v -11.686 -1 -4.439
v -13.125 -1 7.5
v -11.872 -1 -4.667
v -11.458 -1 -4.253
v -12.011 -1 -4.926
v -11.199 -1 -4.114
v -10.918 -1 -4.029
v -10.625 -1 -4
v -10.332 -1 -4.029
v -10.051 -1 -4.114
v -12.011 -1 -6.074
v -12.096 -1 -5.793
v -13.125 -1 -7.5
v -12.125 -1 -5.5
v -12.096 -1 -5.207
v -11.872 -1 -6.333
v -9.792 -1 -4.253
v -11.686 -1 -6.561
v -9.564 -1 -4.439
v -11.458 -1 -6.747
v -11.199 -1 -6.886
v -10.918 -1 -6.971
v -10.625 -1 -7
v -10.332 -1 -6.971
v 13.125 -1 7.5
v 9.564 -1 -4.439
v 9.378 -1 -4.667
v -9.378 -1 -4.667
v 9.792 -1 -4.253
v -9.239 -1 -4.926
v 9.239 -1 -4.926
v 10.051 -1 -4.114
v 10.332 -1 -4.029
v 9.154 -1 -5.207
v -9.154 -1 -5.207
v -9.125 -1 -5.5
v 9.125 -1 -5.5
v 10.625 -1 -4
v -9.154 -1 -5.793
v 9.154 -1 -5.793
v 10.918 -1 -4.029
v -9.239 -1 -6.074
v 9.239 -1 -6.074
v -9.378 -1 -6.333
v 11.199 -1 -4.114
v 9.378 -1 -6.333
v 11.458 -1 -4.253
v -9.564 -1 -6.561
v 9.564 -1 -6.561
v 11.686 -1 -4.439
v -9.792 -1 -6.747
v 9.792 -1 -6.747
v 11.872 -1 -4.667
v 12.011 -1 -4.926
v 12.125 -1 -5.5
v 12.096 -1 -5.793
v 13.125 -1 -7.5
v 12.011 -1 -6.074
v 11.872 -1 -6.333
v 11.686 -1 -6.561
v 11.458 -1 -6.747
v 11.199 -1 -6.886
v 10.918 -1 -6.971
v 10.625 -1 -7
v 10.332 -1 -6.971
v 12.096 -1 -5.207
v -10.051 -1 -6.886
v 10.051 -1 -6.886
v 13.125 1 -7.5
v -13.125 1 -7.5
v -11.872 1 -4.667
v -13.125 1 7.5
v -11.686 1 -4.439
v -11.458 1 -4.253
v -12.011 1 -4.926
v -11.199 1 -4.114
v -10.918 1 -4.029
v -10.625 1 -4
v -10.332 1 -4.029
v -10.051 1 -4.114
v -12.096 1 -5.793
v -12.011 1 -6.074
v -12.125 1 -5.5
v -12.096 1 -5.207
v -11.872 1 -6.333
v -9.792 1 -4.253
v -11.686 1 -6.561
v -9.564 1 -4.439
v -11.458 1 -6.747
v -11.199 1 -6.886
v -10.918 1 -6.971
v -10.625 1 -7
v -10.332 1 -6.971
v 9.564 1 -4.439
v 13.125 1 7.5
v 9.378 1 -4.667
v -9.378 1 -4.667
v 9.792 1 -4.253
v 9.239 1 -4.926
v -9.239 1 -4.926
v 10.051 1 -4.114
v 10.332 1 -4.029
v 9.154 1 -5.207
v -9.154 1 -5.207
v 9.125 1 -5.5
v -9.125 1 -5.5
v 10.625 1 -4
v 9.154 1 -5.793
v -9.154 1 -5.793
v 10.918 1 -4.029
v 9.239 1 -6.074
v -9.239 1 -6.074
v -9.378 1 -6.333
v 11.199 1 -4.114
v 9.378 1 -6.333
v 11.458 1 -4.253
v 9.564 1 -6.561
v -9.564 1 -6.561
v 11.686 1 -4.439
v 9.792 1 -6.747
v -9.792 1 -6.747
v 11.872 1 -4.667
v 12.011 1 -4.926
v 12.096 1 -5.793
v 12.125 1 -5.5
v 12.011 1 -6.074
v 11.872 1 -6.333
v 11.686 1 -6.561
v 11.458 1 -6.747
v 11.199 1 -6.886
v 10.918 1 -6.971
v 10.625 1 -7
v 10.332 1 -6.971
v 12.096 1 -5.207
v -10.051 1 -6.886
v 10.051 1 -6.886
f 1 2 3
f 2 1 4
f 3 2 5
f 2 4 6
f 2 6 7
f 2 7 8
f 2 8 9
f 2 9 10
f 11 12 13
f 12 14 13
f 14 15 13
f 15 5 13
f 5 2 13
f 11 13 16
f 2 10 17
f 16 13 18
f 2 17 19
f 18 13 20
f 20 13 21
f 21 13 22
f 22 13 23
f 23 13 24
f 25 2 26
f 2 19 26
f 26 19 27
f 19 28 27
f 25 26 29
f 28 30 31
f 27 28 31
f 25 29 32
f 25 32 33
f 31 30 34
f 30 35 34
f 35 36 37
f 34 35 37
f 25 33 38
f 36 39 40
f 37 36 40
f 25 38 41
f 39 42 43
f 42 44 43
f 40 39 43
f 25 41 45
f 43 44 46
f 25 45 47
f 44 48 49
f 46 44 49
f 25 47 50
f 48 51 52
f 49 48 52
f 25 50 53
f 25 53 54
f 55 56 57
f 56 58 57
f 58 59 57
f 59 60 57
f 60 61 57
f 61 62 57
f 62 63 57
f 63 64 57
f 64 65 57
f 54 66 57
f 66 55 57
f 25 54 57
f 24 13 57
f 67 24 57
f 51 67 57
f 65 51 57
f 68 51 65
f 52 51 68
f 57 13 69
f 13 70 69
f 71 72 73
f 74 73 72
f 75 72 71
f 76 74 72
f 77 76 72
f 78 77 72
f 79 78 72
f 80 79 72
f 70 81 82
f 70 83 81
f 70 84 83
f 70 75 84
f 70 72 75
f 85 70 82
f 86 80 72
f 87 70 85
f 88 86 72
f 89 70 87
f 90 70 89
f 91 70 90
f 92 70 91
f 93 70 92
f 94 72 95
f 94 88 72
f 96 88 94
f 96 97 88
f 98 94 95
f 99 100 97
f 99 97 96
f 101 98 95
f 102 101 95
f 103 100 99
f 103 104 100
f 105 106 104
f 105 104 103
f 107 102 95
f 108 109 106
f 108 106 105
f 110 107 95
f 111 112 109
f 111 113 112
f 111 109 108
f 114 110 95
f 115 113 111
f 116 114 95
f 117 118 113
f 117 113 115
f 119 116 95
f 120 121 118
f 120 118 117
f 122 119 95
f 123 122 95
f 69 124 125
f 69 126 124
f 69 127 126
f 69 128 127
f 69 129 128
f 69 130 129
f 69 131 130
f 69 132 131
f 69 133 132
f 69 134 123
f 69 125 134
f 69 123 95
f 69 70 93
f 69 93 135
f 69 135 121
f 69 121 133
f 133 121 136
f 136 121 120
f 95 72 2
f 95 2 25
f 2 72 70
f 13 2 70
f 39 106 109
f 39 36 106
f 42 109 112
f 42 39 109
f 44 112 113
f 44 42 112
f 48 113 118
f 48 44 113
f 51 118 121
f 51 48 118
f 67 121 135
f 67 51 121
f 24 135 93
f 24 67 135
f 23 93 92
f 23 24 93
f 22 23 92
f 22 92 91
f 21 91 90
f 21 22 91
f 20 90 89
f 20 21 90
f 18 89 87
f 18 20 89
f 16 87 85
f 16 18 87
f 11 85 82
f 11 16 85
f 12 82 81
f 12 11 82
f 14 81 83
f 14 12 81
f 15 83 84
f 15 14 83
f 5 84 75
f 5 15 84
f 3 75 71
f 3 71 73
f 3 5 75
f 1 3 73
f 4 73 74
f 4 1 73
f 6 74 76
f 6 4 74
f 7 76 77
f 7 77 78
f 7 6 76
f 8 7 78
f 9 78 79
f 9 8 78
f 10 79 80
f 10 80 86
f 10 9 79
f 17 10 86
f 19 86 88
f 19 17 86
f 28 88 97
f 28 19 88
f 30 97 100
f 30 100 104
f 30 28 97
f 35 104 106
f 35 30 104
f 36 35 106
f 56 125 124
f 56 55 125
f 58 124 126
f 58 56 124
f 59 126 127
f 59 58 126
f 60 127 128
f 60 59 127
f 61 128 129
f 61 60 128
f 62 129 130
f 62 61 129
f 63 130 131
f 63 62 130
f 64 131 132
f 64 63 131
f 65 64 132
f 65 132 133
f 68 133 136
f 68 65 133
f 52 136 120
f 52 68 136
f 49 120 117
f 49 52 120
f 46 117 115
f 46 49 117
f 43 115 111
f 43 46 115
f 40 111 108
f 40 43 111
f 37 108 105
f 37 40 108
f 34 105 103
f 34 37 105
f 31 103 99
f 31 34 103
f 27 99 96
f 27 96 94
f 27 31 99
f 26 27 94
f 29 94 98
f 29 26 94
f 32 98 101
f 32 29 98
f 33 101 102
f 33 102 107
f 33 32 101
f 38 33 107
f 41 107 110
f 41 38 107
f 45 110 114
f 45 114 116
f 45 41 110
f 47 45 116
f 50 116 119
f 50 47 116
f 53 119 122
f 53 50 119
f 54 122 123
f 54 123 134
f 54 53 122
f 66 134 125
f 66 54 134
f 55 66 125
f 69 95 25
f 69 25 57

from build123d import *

# Parameters (mm, degrees)
SKETCH1_W           = 26.25
SKETCH1_H           = 15
SKETCH1_R           = 1.5
BOSS_EXTRUDE1_DEPTH = 1


with BuildPart() as part:
    # Sketch1 → Boss-Extrude1 (new body, symmetric)
    with BuildSketch(Plane(origin=(0, 0, 0), x_dir=(1, 0, 0), z_dir=(0, 1, 0))):
        Rectangle(SKETCH1_W, SKETCH1_H)
        with Locations((-10.625, 5.5)):
            Circle(SKETCH1_R, mode=Mode.SUBTRACT)
        with Locations((10.625, 5.5)):
            Circle(SKETCH1_R, mode=Mode.SUBTRACT)
    extrude(amount=BOSS_EXTRUDE1_DEPTH, both=True)


solid = part.part
